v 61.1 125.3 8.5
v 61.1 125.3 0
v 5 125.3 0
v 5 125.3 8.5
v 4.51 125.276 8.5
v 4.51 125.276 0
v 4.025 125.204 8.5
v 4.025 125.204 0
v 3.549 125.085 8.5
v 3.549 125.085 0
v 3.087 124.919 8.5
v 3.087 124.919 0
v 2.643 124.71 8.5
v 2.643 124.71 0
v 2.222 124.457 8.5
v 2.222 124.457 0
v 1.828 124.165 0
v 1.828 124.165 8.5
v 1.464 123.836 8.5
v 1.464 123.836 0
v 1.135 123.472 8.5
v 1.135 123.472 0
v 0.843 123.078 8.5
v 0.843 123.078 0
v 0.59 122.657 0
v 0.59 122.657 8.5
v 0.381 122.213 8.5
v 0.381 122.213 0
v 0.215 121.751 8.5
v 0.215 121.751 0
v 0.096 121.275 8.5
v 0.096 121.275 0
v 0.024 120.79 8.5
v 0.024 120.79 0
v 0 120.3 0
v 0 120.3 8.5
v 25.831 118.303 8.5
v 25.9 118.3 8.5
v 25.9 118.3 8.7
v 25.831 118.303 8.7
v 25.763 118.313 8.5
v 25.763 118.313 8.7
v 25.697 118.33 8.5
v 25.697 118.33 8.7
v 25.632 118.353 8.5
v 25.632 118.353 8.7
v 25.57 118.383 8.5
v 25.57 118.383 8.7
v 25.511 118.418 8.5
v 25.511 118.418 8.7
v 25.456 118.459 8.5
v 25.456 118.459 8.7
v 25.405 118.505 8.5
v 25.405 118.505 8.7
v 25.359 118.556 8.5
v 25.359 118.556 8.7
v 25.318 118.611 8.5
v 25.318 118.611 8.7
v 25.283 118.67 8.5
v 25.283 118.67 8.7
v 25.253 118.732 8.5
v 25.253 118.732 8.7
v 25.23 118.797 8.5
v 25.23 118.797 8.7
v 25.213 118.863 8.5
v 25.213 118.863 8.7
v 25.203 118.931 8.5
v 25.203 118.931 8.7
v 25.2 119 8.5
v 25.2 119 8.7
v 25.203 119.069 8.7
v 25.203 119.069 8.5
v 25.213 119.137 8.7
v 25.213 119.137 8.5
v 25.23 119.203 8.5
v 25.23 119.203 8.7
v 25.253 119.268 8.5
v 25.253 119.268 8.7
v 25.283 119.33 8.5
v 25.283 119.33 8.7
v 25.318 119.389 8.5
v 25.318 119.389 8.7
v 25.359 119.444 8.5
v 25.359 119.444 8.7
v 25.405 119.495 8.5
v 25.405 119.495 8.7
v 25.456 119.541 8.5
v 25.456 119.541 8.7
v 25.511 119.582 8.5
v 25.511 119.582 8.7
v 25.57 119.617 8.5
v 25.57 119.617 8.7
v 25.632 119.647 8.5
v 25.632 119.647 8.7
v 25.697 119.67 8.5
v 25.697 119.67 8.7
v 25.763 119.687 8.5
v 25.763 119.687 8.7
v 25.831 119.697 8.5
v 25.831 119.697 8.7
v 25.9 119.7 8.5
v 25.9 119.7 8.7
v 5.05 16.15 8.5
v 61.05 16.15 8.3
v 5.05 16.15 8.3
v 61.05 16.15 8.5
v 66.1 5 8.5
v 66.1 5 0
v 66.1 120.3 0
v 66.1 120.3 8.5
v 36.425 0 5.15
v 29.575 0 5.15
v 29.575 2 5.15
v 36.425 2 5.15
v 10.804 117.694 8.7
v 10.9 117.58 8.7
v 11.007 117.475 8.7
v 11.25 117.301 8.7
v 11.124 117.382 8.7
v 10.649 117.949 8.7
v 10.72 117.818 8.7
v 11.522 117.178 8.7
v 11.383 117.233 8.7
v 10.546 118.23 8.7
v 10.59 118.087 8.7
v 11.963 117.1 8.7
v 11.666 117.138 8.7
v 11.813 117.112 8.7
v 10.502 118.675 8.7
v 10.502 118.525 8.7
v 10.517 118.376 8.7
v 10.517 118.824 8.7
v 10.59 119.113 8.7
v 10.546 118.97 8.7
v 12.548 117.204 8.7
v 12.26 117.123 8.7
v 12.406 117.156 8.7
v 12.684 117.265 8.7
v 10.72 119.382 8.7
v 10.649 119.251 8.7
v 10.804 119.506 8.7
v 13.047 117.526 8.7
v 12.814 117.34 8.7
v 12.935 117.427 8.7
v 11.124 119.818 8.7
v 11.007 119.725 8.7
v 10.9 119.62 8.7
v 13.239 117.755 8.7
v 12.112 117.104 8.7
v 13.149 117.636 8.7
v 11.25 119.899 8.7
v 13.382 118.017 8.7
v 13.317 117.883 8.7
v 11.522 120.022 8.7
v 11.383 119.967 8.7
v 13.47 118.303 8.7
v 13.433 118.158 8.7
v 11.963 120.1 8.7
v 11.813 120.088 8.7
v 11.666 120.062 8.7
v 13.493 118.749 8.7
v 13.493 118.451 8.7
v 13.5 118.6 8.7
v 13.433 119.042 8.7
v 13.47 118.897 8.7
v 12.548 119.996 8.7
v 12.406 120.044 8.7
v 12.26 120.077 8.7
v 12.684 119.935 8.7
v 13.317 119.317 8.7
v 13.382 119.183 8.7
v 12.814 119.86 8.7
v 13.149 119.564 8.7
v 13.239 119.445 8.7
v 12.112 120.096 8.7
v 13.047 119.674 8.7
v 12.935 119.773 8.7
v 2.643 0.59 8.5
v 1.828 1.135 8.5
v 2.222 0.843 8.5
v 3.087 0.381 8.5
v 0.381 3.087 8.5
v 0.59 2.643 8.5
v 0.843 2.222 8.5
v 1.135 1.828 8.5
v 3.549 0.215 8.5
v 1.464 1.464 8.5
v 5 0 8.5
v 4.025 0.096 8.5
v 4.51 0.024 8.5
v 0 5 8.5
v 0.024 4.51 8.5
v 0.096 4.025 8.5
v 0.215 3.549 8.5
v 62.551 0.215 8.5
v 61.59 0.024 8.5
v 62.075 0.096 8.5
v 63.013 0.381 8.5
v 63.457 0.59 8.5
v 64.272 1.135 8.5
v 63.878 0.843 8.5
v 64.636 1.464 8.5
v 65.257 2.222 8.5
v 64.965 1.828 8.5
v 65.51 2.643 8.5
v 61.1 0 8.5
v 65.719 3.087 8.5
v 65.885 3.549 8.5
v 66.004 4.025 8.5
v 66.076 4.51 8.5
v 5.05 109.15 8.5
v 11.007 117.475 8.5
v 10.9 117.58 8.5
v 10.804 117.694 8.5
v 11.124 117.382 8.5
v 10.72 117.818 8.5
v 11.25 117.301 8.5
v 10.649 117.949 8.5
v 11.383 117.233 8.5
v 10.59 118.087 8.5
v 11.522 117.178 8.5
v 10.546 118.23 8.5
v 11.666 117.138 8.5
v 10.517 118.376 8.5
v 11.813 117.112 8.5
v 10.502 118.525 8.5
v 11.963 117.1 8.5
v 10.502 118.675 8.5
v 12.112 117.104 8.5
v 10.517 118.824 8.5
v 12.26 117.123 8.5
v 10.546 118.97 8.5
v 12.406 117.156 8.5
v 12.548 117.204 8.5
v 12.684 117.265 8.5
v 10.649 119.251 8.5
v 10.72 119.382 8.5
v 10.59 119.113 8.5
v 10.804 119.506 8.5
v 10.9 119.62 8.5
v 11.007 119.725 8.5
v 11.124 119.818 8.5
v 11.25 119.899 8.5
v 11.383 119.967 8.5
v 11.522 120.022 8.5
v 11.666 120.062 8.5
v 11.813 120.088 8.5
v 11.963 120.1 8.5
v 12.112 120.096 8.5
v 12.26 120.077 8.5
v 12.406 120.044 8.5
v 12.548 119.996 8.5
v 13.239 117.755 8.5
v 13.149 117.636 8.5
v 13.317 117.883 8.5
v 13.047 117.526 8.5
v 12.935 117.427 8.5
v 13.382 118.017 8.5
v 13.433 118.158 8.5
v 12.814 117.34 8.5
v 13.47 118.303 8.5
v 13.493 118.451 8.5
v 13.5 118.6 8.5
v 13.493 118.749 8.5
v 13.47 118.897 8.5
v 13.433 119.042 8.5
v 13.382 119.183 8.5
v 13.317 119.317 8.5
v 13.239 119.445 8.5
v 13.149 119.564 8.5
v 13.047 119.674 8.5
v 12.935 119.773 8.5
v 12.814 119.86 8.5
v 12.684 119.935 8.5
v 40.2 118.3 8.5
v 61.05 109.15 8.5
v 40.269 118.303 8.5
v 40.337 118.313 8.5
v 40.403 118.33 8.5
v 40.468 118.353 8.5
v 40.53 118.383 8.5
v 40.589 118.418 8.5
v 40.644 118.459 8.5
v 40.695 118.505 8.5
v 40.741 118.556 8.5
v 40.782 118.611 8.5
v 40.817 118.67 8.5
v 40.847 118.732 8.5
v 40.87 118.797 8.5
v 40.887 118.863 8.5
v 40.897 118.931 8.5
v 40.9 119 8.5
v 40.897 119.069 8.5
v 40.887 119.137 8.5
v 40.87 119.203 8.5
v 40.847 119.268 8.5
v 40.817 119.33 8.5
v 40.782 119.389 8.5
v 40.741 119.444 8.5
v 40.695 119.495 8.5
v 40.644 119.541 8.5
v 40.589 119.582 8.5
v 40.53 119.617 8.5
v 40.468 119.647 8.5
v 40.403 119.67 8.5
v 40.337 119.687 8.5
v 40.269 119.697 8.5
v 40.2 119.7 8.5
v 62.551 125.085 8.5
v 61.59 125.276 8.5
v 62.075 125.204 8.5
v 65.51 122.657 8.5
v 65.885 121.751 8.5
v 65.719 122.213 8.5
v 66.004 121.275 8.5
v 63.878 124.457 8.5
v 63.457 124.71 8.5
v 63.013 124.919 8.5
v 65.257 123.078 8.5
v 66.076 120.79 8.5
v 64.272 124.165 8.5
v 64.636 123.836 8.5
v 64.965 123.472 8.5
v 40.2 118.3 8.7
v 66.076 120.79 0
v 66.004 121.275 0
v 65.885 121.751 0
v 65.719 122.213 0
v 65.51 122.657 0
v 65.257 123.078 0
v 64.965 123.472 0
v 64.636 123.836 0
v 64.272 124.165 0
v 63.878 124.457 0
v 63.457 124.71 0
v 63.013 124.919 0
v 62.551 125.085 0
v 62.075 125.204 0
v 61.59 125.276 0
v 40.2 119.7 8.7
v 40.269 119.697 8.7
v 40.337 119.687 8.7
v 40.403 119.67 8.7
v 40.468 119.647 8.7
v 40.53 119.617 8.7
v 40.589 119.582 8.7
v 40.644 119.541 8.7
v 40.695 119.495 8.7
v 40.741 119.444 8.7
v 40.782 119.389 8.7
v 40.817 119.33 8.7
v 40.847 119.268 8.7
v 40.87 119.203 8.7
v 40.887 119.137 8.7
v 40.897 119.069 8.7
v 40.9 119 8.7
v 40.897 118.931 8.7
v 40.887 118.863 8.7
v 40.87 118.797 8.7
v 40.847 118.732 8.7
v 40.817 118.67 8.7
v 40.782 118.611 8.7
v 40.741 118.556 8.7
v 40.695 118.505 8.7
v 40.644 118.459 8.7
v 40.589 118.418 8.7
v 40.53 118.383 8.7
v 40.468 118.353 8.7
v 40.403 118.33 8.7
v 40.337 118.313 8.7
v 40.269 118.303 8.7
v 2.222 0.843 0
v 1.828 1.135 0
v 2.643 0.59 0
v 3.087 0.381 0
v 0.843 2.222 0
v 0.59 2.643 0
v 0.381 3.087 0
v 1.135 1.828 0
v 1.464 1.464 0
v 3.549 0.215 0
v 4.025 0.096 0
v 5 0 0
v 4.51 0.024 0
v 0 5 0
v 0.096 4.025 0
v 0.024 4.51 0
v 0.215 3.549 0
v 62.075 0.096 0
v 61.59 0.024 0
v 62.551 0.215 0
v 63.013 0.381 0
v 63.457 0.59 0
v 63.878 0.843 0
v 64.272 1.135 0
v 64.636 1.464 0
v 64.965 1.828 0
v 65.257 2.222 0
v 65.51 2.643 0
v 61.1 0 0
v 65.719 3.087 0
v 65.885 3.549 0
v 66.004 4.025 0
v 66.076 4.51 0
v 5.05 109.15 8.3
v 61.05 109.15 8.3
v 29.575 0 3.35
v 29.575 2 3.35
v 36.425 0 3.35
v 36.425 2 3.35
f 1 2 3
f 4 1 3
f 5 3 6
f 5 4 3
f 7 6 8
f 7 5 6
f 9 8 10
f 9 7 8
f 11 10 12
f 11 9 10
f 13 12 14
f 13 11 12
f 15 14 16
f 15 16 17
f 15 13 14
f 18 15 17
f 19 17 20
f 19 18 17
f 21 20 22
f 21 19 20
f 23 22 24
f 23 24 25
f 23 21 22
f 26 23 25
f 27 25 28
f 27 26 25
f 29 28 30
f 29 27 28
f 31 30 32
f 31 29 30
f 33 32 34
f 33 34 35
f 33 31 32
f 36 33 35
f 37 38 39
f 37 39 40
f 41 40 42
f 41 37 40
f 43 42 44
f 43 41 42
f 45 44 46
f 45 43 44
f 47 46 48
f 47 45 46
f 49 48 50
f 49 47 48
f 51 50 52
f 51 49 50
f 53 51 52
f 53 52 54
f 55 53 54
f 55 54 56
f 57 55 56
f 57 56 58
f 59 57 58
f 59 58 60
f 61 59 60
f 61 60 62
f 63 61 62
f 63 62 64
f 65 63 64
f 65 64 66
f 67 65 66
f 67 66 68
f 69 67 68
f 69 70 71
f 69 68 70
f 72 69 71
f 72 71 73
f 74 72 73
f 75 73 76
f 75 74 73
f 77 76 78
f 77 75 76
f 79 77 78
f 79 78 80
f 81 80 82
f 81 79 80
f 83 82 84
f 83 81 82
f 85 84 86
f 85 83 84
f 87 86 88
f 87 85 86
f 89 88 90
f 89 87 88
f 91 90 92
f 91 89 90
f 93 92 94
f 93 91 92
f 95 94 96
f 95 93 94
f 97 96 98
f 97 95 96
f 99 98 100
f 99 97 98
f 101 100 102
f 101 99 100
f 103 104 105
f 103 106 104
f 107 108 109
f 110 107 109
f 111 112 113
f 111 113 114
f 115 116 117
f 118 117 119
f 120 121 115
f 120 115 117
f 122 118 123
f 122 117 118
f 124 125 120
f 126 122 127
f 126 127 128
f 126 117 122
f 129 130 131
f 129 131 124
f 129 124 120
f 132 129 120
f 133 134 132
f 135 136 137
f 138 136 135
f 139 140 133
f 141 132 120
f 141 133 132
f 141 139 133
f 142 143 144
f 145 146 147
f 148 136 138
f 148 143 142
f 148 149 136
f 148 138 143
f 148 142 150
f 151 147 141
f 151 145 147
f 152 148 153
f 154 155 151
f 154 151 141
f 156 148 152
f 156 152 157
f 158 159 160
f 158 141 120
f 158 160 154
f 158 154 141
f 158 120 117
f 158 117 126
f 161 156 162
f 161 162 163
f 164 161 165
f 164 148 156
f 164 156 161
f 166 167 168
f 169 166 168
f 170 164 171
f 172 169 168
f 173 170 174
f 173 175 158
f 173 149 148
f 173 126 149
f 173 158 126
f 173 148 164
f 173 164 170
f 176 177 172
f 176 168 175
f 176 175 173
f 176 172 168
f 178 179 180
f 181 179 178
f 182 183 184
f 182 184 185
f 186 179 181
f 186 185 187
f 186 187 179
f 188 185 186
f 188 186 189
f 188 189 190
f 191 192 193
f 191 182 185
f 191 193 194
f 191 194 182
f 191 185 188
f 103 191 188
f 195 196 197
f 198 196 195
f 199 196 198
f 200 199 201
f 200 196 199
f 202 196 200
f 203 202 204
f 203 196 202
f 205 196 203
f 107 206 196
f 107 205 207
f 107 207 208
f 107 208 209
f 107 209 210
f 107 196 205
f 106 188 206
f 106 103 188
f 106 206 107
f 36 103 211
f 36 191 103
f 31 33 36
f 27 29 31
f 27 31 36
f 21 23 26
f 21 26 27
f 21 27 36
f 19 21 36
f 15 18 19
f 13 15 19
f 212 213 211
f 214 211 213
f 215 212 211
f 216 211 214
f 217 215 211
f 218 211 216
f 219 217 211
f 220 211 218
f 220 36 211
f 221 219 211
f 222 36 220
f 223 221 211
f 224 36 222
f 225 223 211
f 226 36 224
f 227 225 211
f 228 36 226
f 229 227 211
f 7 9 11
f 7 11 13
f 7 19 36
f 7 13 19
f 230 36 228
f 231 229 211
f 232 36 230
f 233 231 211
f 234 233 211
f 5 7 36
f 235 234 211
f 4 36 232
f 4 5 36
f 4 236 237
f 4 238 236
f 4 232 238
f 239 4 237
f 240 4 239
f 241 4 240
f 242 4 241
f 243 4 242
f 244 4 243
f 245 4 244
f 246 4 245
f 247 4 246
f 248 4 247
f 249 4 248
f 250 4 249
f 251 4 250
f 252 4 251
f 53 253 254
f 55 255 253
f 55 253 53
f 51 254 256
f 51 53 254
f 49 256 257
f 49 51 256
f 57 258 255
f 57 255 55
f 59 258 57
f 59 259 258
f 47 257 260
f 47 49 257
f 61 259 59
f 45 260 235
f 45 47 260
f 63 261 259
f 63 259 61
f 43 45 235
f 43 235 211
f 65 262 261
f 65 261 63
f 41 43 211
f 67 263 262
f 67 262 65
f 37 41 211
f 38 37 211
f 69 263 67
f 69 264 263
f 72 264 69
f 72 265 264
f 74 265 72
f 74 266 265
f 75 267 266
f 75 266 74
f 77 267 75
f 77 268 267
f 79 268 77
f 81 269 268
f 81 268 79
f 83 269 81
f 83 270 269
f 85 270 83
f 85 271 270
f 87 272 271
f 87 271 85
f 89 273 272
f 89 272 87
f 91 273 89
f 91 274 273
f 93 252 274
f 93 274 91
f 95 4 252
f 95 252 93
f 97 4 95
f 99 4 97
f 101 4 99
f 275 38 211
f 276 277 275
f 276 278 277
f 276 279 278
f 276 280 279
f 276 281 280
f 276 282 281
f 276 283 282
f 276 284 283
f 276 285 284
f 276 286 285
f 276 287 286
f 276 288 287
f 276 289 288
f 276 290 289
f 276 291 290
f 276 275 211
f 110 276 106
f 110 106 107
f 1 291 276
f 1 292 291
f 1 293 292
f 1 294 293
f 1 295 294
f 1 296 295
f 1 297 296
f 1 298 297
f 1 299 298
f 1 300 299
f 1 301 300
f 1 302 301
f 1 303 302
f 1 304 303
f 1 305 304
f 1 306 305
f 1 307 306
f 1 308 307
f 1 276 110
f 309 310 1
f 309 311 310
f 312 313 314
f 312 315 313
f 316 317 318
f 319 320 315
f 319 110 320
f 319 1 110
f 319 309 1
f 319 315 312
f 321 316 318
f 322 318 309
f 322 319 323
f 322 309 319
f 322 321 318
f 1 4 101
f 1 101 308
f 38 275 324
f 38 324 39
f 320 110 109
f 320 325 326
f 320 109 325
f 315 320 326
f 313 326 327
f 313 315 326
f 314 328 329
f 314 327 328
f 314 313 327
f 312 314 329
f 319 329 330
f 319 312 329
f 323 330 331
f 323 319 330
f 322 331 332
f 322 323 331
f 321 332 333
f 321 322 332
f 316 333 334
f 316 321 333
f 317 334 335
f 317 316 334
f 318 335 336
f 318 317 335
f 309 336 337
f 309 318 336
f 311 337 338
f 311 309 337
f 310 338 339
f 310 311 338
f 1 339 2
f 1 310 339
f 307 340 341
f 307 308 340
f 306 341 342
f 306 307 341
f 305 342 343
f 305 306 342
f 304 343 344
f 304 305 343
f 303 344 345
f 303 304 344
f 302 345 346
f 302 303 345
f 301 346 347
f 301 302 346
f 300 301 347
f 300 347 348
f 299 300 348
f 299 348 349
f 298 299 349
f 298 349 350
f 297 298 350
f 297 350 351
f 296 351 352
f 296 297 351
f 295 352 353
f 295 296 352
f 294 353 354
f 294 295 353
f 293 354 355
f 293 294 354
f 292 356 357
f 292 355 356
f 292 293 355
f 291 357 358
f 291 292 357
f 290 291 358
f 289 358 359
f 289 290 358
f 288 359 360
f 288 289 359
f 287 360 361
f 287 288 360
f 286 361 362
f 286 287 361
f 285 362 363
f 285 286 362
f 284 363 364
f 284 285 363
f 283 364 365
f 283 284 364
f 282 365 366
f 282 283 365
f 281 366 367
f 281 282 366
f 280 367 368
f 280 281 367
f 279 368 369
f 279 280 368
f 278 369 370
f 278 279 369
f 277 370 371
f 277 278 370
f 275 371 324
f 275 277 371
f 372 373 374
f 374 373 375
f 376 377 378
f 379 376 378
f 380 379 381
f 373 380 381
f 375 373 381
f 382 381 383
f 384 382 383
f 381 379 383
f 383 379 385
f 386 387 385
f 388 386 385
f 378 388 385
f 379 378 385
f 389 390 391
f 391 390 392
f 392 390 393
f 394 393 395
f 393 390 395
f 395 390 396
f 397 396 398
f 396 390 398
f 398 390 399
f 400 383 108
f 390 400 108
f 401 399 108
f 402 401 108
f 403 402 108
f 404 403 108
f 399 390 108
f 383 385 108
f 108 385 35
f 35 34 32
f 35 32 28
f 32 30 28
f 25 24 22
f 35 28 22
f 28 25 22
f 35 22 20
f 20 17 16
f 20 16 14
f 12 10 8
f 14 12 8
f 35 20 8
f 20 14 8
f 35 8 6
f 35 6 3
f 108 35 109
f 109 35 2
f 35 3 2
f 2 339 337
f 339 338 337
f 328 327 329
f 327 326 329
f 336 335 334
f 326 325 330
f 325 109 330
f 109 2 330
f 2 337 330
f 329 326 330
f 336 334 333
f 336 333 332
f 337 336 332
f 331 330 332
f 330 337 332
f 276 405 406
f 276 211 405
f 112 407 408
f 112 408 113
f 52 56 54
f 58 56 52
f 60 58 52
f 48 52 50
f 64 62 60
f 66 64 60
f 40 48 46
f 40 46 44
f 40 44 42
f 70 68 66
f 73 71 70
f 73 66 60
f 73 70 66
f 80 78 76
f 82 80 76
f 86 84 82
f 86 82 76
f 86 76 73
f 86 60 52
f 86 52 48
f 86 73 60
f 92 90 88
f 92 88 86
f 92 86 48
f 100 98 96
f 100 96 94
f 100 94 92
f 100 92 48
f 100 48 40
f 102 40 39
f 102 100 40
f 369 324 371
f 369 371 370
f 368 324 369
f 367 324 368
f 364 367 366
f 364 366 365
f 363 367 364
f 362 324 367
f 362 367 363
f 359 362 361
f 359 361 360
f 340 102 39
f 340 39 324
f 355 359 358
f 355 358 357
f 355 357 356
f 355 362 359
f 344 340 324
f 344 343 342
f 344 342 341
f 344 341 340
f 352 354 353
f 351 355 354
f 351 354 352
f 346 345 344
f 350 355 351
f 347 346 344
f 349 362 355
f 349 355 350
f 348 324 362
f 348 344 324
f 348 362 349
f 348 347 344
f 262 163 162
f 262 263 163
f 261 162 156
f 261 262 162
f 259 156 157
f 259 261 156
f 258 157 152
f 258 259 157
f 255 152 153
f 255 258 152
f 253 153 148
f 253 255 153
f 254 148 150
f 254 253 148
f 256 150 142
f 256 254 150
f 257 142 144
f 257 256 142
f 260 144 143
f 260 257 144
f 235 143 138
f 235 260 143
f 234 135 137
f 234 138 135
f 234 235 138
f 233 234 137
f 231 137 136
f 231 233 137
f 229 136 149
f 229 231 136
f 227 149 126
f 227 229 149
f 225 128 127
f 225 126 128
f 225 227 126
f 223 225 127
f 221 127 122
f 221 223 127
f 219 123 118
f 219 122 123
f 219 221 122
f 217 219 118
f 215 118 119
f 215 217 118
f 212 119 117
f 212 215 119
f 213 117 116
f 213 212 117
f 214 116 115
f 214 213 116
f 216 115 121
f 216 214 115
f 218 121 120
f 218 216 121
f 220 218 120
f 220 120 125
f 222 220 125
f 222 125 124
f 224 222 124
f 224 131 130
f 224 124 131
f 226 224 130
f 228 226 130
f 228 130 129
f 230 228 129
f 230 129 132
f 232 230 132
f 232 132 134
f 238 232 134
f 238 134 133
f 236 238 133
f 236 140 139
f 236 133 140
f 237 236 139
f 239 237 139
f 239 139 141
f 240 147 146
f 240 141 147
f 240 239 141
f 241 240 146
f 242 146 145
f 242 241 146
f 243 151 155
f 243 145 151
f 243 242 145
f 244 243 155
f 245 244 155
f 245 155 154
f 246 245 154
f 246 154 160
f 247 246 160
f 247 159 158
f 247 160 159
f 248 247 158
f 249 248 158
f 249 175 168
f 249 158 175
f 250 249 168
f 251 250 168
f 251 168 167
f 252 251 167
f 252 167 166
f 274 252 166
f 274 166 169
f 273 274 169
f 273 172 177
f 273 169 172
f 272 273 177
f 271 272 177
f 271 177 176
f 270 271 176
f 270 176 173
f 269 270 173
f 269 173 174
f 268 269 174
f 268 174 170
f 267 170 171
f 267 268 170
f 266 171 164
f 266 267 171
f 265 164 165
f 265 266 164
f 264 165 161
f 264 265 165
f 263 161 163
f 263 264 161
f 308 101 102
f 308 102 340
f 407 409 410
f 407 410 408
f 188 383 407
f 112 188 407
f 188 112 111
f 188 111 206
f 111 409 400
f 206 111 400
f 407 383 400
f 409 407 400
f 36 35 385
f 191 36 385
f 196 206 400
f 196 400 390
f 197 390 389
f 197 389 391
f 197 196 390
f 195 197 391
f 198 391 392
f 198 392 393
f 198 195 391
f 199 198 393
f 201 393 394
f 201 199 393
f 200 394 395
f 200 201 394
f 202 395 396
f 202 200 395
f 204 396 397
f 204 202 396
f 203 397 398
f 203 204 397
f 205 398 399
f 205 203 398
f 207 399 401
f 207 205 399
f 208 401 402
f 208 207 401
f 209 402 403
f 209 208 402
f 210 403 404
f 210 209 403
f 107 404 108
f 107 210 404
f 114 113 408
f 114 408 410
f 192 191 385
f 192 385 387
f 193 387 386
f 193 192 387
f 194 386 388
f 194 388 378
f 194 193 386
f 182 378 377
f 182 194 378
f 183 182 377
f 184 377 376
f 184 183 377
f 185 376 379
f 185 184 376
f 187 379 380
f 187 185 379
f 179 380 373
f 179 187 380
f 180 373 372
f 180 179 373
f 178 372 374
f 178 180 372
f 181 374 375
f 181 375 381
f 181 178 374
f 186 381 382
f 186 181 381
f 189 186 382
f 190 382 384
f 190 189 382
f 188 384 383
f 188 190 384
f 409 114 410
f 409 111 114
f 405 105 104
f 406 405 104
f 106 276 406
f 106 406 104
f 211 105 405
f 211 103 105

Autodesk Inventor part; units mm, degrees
ref_plane "YZ Plane" through (0, 0, 0) normal (1, 0, 0) x (0, 1, 0)
ref_plane "XZ Plane" through (0, 0, 0) normal (0, 1, 0) x (-1, 0, 0)
ref_plane "XY Plane" through (0, 0, 0) normal (0, 0, 1) x (1, 0, 0)
sketch "Skizze1" plane through (0, 0, 0) normal (0, 0, 1) x (1, 0, 0)
  line L0 (0, 0) -> (66.1, 0)
  line L1 (66.1, 0) -> (66.1, 125.3)
  line L2 (66.1, 125.3) -> (0, 125.3)
  line L3 (0, 125.3) -> (0, 0)
  dimension "d0" = 66.1
  dimension "d1" = 125.3
extrude "Extrusion1" add sketch "Skizze1" along normal blind 8.5
fillet "Rundung1" radius 5 1 edges at (66.1, 125.3, 4.25)
fillet "Rundung2" radius 5 1 edges at (0, 125.3, 4.25)
fillet "Rundung3" radius 5 1 edges at (0, 0, 4.25)
fillet "Rundung4" radius 5 1 edges at (66.1, 0, 4.25)
sketch "Skizze2" plane through (0, 0, 8.5) normal (0, 0, 1) x (1, 0, 0)
  line L0 (66.1, 5) -> (66.1, 120.3) projected
  line L1 (61.1, 125.3) -> (5, 125.3) projected
  line L2 (0, 120.3) -> (0, 5) projected
  line L3 (5.05, 109.15) -> (61.05, 109.15)
  line L4 (61.05, 109.15) -> (61.05, 16.15)
  line L5 (61.05, 16.15) -> (5.05, 16.15)
  line L6 (5.05, 16.15) -> (5.05, 109.15)
  point P0 (0, 0)
  dimension "d8" = 56
  dimension "d9" = 93
  dimension "d10" = 5.05
  dimension "d11" = 16.15
sketch "Skizze3" plane through (0, 0, 8.5) normal (0, 0, 1) x (1, 0, 0)
  line L0 (66.1, 5) -> (66.1, 120.3) projected
  line L1 (61.1, 125.3) -> (5, 125.3) projected
  line L2 (0, 120.3) -> (0, 5) projected
  line L3 (5, 0) -> (61.1, 0) projected
  circle A0 centre (12, 118.6) radius 1.5
  line L4 (25.9, 119.7) -> (40.2, 119.7)
  arc A1 (40.2, 118.3) -> (40.2, 119.7) centre (40.2, 119) ccw
  line L5 (40.2, 118.3) -> (25.9, 118.3)
  arc A2 (25.9, 119.7) -> (25.9, 118.3) centre (25.9, 119) ccw
  point P0 (0, 0)
  dimension "d0" = 66.1
  dimension "d12" = 6.7
  dimension "d13" = 12
  dimension "d14" = 3
  dimension "d19" = 1.4
  dimension "d22" = 5.6
  dimension "d23" = 15.7
  dimension "d27" = 14.3
  dimension "d28" = 25.9
extrude "Extrusion2" add sketch "Skizze3" along normal blind 0.2
extrude "Extrusion3" cut sketch "Skizze2" against normal blind 0.2
sketch "Skizze5" plane through (5, 0, 0) normal (0, -1, 0) x (1, 0, 0)
  line L0 (0, 8.5) -> (56.1, 8.5) projected
  line L1 (0, 0) -> (0, 8.5) projected
  line L2 (0, 0) -> (56.1, 0) projected
  line L3 (24.575, 5.15) -> (31.425, 5.15)
  line L4 (31.425, 5.15) -> (31.425, 3.35)
  line L5 (31.425, 3.35) -> (24.575, 3.35)
  line L6 (24.575, 3.35) -> (24.575, 5.15)
  line L7 (56.1, 8.5) -> (56.1, 0) projected
  line L8 (0, 8.5) -> (56.1, 8.5) projected
  line L9 (0, 0) -> (0, 8.5) projected
  line L10 (0, 0) -> (56.1, 0) projected
  point P0 (-5, 0)
  dimension "d33" = 6.85
  dimension "d34" = 1.8
  dimension "d35" = 24.575
  dimension "d36" = 3.35
extrude "Extrusion4" cut sketch "Skizze5" against normal blind 2 contours L3 L4 L5 L6
equation "\"d10\" = -0.5 * d8 + 0.5 * d0"
equation "\"d11\" = -0.5 * d9 + 0.5 * d1"
equation "\"d28\" = 0.5 * d0 - 0.5 * d27"
equation "\"d35\" = -0.5 * d33 + 0.5 * d8"
properties part number "Galaxy S2"
